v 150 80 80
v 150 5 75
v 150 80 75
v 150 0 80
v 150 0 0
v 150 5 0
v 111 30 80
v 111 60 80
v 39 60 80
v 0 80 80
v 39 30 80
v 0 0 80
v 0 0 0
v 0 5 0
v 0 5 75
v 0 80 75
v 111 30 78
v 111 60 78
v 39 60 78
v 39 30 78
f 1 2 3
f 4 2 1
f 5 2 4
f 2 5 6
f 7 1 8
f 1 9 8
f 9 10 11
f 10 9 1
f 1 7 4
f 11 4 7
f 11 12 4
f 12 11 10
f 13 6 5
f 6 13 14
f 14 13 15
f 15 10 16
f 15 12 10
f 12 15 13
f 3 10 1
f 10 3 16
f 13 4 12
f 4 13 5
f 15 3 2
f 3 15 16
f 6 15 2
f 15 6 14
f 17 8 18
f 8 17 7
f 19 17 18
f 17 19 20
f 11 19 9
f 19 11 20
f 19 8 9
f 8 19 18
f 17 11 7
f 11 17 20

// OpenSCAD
BoxH=80;
BoxW=150;
BoxD=80;
cutH=BoxH+10;
cutW=BoxW+10;
cutD=BoxD+10;
slotH=3;
slotW=72;
slotD=30;

difference()
{
  cube([BoxW,BoxD,BoxH]);
  translate([-5,5,-15]) cube([cutW,cutD,cutH]);
  translate([(BoxW/2)-(slotW/2),(BoxD/2)-(slotD/2)+5,BoxH-slotH+1]) cube([slotW,slotD,slotH]);
}
